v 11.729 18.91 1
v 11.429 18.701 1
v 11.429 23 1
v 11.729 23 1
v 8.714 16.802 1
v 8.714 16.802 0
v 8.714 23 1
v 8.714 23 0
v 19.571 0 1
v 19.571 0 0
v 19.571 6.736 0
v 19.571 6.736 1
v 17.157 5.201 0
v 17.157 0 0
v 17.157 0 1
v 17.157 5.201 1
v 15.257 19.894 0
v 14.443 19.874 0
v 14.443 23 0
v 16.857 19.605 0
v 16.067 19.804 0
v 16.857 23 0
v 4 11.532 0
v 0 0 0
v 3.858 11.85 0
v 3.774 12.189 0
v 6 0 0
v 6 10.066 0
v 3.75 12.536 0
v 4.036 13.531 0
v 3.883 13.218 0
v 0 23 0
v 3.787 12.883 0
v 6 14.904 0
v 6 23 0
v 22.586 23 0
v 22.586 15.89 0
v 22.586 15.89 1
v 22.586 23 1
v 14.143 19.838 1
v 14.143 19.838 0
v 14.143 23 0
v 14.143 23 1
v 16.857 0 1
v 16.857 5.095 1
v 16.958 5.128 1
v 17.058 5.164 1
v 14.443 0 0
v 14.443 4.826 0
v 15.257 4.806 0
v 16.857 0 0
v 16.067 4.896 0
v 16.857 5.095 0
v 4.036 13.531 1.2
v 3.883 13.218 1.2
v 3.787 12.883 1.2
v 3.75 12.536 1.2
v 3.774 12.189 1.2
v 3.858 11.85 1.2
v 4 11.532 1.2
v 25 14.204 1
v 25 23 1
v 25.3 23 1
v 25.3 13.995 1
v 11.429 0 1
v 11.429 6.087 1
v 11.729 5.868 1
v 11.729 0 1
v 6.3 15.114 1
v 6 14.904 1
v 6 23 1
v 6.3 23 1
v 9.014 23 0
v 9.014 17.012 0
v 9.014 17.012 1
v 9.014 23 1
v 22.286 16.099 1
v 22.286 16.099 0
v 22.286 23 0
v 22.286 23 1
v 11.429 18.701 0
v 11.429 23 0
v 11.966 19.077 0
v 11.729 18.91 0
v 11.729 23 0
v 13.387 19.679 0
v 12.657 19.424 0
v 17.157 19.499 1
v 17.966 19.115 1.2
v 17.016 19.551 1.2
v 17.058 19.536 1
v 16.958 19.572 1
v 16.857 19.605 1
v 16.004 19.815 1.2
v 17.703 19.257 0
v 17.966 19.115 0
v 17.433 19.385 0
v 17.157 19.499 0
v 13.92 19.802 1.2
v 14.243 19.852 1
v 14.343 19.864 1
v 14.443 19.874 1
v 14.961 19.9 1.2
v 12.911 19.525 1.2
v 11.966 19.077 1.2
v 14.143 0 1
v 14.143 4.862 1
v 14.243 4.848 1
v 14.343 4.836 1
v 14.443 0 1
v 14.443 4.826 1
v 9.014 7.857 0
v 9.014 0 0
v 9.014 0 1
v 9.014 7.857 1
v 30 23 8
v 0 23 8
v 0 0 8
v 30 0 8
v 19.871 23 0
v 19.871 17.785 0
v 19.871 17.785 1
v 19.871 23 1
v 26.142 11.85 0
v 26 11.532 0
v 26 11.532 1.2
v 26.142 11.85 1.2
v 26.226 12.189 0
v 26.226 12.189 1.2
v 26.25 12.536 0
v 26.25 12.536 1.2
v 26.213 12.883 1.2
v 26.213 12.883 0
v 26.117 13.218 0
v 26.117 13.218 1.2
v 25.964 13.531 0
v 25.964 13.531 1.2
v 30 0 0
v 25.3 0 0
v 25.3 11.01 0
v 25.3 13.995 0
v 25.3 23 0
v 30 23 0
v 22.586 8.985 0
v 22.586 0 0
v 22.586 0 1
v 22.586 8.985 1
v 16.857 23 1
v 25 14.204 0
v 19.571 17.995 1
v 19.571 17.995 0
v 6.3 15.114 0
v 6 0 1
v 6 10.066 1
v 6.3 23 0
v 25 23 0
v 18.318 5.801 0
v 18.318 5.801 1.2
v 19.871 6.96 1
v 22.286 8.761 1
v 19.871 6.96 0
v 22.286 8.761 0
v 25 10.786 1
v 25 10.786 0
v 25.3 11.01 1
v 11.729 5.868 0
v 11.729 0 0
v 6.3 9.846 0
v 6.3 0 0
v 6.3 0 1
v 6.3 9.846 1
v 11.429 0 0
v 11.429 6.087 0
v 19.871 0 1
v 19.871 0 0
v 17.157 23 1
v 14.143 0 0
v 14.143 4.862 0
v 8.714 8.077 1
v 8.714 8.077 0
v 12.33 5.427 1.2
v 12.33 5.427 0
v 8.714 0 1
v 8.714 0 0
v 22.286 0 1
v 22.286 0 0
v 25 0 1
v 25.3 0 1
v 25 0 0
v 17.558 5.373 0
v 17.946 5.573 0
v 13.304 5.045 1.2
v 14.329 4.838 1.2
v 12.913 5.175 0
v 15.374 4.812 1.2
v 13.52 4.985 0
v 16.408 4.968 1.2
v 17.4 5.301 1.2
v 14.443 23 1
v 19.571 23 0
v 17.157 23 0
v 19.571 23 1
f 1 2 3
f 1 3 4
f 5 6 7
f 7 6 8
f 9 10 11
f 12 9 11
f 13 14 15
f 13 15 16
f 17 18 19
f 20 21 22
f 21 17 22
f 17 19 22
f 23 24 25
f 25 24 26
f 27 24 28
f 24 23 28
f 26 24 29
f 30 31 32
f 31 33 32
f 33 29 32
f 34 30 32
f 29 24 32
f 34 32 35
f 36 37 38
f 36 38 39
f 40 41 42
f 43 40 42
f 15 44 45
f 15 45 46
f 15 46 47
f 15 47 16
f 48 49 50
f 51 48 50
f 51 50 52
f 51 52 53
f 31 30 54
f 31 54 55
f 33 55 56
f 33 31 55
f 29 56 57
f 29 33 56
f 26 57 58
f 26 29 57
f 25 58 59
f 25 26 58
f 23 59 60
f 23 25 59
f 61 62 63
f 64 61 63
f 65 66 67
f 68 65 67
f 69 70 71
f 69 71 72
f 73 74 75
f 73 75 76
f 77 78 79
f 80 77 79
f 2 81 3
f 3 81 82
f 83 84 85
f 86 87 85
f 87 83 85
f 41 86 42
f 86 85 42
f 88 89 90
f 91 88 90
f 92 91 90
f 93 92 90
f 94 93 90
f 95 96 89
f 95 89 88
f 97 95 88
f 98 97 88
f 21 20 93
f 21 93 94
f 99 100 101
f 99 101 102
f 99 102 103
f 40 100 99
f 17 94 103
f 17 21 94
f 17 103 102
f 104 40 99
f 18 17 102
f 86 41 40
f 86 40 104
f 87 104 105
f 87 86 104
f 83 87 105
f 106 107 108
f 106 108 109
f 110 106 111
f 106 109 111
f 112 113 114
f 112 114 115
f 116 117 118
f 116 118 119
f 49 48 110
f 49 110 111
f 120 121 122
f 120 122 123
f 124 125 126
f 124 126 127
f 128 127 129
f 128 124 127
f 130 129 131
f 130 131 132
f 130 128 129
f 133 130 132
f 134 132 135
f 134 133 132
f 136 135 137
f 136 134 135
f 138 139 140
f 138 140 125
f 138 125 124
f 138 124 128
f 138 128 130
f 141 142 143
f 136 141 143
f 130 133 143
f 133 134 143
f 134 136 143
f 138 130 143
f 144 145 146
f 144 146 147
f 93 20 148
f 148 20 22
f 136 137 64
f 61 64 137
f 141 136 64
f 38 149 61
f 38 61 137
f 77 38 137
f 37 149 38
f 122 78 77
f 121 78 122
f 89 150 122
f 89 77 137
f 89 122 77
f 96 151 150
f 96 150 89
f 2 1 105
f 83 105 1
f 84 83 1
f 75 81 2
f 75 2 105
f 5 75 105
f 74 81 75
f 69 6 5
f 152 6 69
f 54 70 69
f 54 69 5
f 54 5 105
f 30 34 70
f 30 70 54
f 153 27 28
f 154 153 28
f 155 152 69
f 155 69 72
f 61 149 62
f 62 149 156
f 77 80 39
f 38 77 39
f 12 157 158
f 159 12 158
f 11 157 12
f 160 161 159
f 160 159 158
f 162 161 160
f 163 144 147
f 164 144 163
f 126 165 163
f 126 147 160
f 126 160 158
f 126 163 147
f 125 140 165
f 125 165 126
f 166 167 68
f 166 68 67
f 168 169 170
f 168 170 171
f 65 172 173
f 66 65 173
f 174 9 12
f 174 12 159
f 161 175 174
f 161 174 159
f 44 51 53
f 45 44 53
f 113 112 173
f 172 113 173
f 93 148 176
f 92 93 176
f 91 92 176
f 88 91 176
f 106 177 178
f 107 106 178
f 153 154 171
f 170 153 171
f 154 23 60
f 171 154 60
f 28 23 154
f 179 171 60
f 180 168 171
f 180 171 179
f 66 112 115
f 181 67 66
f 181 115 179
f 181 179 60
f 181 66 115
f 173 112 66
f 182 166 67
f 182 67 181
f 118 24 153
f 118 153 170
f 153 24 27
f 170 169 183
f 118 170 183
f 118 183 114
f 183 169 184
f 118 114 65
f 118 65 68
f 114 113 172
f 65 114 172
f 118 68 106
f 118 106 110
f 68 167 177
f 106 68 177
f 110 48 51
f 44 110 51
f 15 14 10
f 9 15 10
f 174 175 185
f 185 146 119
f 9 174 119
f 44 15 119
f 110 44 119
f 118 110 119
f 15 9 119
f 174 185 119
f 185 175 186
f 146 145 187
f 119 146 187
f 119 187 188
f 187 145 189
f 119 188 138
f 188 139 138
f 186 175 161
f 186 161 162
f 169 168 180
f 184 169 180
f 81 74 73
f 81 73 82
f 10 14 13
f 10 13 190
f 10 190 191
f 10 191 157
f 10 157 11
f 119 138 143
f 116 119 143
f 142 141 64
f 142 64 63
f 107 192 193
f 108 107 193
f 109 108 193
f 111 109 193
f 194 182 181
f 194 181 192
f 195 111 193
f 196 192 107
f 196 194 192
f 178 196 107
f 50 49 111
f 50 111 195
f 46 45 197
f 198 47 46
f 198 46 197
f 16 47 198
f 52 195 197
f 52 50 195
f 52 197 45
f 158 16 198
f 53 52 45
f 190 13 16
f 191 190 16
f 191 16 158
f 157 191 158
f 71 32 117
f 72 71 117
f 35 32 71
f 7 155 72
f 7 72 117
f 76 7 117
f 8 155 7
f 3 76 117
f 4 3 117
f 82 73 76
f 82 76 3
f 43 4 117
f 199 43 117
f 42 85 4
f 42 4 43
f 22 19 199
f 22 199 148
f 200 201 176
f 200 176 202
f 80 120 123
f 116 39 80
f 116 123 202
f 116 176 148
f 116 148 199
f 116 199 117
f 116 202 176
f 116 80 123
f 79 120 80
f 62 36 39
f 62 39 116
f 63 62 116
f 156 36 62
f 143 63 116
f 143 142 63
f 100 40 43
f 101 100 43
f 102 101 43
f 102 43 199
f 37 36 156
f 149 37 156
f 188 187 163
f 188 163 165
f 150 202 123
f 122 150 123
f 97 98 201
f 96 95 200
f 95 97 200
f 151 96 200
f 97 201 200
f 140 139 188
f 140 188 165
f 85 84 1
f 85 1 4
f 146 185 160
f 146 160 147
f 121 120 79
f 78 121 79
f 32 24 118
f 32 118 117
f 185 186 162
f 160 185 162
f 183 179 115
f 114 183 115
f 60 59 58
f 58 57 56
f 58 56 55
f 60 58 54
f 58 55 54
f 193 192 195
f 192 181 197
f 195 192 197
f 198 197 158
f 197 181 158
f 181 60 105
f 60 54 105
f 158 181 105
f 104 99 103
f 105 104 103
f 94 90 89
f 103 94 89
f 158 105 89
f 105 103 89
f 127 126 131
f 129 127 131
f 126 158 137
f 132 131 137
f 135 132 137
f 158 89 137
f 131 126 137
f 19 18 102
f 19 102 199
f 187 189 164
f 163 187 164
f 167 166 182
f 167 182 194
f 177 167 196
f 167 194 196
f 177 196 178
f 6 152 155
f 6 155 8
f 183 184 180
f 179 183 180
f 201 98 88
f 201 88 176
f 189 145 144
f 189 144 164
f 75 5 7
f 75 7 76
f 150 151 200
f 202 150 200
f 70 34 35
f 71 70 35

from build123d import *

# Parameters (mm, degrees)
SKETCH_W            = 30
SKETCH_H            = 23
PAD002_DEPTH        = 8
POCKET001_DEPTH     = 1.2
SKETCH002_W         = 0.3
SKETCH002_H         = 23
POCKET_DEPTH        = 1
LINEARPATTERN_COUNT = 8
LINEARPATTERN_PITCH = 2.714286


with BuildPart() as part:
    # Sketch → Pad002 (new body)
    with BuildSketch(Plane.XY):
        with Locations((15, 11.5)):
            Rectangle(SKETCH_W, SKETCH_H)
    extrude(amount=PAD002_DEPTH)

    # Sketch001 → Pocket001 (cut)
    with BuildSketch(Plane.XY):
        with BuildLine():
            ThreePointArc((17.966363, 19.115428), (14.961232, 19.899875), (11.966488, 19.07666))
            Line((11.966488, 19.07666), (4.036475, 13.531422))
            ThreePointArc((4.036475, 13.531422), (3.750333, 12.536475), (4, 11.531754))
            Line((4, 11.531754), (12.33, 5.426817))
            ThreePointArc((12.33, 5.426817), (15.374304, 4.811687), (18.318313, 5.80112))
            Line((18.318313, 5.80112), (26, 11.531754))
            ThreePointArc((26, 11.531754), (26.249667, 12.536475), (25.963525, 13.531422))
            Line((25.963525, 13.531422), (17.966363, 19.115428))
        make_face()
    extrude(amount=POCKET001_DEPTH, mode=Mode.SUBTRACT)

    # Sketch002 → Pocket (cut)
    with BuildSketch(Plane.XY):
        with Locations((6.15, 11.5)):
            Rectangle(SKETCH002_W, SKETCH002_H)
    pocket = extrude(amount=POCKET_DEPTH, mode=Mode.SUBTRACT)

    # LinearPattern: Pocket ×8
    with Locations(*[(i * LINEARPATTERN_PITCH, 0, 0) for i in range(1, LINEARPATTERN_COUNT)]):
        add(pocket, mode=Mode.SUBTRACT)


solid = part.part
